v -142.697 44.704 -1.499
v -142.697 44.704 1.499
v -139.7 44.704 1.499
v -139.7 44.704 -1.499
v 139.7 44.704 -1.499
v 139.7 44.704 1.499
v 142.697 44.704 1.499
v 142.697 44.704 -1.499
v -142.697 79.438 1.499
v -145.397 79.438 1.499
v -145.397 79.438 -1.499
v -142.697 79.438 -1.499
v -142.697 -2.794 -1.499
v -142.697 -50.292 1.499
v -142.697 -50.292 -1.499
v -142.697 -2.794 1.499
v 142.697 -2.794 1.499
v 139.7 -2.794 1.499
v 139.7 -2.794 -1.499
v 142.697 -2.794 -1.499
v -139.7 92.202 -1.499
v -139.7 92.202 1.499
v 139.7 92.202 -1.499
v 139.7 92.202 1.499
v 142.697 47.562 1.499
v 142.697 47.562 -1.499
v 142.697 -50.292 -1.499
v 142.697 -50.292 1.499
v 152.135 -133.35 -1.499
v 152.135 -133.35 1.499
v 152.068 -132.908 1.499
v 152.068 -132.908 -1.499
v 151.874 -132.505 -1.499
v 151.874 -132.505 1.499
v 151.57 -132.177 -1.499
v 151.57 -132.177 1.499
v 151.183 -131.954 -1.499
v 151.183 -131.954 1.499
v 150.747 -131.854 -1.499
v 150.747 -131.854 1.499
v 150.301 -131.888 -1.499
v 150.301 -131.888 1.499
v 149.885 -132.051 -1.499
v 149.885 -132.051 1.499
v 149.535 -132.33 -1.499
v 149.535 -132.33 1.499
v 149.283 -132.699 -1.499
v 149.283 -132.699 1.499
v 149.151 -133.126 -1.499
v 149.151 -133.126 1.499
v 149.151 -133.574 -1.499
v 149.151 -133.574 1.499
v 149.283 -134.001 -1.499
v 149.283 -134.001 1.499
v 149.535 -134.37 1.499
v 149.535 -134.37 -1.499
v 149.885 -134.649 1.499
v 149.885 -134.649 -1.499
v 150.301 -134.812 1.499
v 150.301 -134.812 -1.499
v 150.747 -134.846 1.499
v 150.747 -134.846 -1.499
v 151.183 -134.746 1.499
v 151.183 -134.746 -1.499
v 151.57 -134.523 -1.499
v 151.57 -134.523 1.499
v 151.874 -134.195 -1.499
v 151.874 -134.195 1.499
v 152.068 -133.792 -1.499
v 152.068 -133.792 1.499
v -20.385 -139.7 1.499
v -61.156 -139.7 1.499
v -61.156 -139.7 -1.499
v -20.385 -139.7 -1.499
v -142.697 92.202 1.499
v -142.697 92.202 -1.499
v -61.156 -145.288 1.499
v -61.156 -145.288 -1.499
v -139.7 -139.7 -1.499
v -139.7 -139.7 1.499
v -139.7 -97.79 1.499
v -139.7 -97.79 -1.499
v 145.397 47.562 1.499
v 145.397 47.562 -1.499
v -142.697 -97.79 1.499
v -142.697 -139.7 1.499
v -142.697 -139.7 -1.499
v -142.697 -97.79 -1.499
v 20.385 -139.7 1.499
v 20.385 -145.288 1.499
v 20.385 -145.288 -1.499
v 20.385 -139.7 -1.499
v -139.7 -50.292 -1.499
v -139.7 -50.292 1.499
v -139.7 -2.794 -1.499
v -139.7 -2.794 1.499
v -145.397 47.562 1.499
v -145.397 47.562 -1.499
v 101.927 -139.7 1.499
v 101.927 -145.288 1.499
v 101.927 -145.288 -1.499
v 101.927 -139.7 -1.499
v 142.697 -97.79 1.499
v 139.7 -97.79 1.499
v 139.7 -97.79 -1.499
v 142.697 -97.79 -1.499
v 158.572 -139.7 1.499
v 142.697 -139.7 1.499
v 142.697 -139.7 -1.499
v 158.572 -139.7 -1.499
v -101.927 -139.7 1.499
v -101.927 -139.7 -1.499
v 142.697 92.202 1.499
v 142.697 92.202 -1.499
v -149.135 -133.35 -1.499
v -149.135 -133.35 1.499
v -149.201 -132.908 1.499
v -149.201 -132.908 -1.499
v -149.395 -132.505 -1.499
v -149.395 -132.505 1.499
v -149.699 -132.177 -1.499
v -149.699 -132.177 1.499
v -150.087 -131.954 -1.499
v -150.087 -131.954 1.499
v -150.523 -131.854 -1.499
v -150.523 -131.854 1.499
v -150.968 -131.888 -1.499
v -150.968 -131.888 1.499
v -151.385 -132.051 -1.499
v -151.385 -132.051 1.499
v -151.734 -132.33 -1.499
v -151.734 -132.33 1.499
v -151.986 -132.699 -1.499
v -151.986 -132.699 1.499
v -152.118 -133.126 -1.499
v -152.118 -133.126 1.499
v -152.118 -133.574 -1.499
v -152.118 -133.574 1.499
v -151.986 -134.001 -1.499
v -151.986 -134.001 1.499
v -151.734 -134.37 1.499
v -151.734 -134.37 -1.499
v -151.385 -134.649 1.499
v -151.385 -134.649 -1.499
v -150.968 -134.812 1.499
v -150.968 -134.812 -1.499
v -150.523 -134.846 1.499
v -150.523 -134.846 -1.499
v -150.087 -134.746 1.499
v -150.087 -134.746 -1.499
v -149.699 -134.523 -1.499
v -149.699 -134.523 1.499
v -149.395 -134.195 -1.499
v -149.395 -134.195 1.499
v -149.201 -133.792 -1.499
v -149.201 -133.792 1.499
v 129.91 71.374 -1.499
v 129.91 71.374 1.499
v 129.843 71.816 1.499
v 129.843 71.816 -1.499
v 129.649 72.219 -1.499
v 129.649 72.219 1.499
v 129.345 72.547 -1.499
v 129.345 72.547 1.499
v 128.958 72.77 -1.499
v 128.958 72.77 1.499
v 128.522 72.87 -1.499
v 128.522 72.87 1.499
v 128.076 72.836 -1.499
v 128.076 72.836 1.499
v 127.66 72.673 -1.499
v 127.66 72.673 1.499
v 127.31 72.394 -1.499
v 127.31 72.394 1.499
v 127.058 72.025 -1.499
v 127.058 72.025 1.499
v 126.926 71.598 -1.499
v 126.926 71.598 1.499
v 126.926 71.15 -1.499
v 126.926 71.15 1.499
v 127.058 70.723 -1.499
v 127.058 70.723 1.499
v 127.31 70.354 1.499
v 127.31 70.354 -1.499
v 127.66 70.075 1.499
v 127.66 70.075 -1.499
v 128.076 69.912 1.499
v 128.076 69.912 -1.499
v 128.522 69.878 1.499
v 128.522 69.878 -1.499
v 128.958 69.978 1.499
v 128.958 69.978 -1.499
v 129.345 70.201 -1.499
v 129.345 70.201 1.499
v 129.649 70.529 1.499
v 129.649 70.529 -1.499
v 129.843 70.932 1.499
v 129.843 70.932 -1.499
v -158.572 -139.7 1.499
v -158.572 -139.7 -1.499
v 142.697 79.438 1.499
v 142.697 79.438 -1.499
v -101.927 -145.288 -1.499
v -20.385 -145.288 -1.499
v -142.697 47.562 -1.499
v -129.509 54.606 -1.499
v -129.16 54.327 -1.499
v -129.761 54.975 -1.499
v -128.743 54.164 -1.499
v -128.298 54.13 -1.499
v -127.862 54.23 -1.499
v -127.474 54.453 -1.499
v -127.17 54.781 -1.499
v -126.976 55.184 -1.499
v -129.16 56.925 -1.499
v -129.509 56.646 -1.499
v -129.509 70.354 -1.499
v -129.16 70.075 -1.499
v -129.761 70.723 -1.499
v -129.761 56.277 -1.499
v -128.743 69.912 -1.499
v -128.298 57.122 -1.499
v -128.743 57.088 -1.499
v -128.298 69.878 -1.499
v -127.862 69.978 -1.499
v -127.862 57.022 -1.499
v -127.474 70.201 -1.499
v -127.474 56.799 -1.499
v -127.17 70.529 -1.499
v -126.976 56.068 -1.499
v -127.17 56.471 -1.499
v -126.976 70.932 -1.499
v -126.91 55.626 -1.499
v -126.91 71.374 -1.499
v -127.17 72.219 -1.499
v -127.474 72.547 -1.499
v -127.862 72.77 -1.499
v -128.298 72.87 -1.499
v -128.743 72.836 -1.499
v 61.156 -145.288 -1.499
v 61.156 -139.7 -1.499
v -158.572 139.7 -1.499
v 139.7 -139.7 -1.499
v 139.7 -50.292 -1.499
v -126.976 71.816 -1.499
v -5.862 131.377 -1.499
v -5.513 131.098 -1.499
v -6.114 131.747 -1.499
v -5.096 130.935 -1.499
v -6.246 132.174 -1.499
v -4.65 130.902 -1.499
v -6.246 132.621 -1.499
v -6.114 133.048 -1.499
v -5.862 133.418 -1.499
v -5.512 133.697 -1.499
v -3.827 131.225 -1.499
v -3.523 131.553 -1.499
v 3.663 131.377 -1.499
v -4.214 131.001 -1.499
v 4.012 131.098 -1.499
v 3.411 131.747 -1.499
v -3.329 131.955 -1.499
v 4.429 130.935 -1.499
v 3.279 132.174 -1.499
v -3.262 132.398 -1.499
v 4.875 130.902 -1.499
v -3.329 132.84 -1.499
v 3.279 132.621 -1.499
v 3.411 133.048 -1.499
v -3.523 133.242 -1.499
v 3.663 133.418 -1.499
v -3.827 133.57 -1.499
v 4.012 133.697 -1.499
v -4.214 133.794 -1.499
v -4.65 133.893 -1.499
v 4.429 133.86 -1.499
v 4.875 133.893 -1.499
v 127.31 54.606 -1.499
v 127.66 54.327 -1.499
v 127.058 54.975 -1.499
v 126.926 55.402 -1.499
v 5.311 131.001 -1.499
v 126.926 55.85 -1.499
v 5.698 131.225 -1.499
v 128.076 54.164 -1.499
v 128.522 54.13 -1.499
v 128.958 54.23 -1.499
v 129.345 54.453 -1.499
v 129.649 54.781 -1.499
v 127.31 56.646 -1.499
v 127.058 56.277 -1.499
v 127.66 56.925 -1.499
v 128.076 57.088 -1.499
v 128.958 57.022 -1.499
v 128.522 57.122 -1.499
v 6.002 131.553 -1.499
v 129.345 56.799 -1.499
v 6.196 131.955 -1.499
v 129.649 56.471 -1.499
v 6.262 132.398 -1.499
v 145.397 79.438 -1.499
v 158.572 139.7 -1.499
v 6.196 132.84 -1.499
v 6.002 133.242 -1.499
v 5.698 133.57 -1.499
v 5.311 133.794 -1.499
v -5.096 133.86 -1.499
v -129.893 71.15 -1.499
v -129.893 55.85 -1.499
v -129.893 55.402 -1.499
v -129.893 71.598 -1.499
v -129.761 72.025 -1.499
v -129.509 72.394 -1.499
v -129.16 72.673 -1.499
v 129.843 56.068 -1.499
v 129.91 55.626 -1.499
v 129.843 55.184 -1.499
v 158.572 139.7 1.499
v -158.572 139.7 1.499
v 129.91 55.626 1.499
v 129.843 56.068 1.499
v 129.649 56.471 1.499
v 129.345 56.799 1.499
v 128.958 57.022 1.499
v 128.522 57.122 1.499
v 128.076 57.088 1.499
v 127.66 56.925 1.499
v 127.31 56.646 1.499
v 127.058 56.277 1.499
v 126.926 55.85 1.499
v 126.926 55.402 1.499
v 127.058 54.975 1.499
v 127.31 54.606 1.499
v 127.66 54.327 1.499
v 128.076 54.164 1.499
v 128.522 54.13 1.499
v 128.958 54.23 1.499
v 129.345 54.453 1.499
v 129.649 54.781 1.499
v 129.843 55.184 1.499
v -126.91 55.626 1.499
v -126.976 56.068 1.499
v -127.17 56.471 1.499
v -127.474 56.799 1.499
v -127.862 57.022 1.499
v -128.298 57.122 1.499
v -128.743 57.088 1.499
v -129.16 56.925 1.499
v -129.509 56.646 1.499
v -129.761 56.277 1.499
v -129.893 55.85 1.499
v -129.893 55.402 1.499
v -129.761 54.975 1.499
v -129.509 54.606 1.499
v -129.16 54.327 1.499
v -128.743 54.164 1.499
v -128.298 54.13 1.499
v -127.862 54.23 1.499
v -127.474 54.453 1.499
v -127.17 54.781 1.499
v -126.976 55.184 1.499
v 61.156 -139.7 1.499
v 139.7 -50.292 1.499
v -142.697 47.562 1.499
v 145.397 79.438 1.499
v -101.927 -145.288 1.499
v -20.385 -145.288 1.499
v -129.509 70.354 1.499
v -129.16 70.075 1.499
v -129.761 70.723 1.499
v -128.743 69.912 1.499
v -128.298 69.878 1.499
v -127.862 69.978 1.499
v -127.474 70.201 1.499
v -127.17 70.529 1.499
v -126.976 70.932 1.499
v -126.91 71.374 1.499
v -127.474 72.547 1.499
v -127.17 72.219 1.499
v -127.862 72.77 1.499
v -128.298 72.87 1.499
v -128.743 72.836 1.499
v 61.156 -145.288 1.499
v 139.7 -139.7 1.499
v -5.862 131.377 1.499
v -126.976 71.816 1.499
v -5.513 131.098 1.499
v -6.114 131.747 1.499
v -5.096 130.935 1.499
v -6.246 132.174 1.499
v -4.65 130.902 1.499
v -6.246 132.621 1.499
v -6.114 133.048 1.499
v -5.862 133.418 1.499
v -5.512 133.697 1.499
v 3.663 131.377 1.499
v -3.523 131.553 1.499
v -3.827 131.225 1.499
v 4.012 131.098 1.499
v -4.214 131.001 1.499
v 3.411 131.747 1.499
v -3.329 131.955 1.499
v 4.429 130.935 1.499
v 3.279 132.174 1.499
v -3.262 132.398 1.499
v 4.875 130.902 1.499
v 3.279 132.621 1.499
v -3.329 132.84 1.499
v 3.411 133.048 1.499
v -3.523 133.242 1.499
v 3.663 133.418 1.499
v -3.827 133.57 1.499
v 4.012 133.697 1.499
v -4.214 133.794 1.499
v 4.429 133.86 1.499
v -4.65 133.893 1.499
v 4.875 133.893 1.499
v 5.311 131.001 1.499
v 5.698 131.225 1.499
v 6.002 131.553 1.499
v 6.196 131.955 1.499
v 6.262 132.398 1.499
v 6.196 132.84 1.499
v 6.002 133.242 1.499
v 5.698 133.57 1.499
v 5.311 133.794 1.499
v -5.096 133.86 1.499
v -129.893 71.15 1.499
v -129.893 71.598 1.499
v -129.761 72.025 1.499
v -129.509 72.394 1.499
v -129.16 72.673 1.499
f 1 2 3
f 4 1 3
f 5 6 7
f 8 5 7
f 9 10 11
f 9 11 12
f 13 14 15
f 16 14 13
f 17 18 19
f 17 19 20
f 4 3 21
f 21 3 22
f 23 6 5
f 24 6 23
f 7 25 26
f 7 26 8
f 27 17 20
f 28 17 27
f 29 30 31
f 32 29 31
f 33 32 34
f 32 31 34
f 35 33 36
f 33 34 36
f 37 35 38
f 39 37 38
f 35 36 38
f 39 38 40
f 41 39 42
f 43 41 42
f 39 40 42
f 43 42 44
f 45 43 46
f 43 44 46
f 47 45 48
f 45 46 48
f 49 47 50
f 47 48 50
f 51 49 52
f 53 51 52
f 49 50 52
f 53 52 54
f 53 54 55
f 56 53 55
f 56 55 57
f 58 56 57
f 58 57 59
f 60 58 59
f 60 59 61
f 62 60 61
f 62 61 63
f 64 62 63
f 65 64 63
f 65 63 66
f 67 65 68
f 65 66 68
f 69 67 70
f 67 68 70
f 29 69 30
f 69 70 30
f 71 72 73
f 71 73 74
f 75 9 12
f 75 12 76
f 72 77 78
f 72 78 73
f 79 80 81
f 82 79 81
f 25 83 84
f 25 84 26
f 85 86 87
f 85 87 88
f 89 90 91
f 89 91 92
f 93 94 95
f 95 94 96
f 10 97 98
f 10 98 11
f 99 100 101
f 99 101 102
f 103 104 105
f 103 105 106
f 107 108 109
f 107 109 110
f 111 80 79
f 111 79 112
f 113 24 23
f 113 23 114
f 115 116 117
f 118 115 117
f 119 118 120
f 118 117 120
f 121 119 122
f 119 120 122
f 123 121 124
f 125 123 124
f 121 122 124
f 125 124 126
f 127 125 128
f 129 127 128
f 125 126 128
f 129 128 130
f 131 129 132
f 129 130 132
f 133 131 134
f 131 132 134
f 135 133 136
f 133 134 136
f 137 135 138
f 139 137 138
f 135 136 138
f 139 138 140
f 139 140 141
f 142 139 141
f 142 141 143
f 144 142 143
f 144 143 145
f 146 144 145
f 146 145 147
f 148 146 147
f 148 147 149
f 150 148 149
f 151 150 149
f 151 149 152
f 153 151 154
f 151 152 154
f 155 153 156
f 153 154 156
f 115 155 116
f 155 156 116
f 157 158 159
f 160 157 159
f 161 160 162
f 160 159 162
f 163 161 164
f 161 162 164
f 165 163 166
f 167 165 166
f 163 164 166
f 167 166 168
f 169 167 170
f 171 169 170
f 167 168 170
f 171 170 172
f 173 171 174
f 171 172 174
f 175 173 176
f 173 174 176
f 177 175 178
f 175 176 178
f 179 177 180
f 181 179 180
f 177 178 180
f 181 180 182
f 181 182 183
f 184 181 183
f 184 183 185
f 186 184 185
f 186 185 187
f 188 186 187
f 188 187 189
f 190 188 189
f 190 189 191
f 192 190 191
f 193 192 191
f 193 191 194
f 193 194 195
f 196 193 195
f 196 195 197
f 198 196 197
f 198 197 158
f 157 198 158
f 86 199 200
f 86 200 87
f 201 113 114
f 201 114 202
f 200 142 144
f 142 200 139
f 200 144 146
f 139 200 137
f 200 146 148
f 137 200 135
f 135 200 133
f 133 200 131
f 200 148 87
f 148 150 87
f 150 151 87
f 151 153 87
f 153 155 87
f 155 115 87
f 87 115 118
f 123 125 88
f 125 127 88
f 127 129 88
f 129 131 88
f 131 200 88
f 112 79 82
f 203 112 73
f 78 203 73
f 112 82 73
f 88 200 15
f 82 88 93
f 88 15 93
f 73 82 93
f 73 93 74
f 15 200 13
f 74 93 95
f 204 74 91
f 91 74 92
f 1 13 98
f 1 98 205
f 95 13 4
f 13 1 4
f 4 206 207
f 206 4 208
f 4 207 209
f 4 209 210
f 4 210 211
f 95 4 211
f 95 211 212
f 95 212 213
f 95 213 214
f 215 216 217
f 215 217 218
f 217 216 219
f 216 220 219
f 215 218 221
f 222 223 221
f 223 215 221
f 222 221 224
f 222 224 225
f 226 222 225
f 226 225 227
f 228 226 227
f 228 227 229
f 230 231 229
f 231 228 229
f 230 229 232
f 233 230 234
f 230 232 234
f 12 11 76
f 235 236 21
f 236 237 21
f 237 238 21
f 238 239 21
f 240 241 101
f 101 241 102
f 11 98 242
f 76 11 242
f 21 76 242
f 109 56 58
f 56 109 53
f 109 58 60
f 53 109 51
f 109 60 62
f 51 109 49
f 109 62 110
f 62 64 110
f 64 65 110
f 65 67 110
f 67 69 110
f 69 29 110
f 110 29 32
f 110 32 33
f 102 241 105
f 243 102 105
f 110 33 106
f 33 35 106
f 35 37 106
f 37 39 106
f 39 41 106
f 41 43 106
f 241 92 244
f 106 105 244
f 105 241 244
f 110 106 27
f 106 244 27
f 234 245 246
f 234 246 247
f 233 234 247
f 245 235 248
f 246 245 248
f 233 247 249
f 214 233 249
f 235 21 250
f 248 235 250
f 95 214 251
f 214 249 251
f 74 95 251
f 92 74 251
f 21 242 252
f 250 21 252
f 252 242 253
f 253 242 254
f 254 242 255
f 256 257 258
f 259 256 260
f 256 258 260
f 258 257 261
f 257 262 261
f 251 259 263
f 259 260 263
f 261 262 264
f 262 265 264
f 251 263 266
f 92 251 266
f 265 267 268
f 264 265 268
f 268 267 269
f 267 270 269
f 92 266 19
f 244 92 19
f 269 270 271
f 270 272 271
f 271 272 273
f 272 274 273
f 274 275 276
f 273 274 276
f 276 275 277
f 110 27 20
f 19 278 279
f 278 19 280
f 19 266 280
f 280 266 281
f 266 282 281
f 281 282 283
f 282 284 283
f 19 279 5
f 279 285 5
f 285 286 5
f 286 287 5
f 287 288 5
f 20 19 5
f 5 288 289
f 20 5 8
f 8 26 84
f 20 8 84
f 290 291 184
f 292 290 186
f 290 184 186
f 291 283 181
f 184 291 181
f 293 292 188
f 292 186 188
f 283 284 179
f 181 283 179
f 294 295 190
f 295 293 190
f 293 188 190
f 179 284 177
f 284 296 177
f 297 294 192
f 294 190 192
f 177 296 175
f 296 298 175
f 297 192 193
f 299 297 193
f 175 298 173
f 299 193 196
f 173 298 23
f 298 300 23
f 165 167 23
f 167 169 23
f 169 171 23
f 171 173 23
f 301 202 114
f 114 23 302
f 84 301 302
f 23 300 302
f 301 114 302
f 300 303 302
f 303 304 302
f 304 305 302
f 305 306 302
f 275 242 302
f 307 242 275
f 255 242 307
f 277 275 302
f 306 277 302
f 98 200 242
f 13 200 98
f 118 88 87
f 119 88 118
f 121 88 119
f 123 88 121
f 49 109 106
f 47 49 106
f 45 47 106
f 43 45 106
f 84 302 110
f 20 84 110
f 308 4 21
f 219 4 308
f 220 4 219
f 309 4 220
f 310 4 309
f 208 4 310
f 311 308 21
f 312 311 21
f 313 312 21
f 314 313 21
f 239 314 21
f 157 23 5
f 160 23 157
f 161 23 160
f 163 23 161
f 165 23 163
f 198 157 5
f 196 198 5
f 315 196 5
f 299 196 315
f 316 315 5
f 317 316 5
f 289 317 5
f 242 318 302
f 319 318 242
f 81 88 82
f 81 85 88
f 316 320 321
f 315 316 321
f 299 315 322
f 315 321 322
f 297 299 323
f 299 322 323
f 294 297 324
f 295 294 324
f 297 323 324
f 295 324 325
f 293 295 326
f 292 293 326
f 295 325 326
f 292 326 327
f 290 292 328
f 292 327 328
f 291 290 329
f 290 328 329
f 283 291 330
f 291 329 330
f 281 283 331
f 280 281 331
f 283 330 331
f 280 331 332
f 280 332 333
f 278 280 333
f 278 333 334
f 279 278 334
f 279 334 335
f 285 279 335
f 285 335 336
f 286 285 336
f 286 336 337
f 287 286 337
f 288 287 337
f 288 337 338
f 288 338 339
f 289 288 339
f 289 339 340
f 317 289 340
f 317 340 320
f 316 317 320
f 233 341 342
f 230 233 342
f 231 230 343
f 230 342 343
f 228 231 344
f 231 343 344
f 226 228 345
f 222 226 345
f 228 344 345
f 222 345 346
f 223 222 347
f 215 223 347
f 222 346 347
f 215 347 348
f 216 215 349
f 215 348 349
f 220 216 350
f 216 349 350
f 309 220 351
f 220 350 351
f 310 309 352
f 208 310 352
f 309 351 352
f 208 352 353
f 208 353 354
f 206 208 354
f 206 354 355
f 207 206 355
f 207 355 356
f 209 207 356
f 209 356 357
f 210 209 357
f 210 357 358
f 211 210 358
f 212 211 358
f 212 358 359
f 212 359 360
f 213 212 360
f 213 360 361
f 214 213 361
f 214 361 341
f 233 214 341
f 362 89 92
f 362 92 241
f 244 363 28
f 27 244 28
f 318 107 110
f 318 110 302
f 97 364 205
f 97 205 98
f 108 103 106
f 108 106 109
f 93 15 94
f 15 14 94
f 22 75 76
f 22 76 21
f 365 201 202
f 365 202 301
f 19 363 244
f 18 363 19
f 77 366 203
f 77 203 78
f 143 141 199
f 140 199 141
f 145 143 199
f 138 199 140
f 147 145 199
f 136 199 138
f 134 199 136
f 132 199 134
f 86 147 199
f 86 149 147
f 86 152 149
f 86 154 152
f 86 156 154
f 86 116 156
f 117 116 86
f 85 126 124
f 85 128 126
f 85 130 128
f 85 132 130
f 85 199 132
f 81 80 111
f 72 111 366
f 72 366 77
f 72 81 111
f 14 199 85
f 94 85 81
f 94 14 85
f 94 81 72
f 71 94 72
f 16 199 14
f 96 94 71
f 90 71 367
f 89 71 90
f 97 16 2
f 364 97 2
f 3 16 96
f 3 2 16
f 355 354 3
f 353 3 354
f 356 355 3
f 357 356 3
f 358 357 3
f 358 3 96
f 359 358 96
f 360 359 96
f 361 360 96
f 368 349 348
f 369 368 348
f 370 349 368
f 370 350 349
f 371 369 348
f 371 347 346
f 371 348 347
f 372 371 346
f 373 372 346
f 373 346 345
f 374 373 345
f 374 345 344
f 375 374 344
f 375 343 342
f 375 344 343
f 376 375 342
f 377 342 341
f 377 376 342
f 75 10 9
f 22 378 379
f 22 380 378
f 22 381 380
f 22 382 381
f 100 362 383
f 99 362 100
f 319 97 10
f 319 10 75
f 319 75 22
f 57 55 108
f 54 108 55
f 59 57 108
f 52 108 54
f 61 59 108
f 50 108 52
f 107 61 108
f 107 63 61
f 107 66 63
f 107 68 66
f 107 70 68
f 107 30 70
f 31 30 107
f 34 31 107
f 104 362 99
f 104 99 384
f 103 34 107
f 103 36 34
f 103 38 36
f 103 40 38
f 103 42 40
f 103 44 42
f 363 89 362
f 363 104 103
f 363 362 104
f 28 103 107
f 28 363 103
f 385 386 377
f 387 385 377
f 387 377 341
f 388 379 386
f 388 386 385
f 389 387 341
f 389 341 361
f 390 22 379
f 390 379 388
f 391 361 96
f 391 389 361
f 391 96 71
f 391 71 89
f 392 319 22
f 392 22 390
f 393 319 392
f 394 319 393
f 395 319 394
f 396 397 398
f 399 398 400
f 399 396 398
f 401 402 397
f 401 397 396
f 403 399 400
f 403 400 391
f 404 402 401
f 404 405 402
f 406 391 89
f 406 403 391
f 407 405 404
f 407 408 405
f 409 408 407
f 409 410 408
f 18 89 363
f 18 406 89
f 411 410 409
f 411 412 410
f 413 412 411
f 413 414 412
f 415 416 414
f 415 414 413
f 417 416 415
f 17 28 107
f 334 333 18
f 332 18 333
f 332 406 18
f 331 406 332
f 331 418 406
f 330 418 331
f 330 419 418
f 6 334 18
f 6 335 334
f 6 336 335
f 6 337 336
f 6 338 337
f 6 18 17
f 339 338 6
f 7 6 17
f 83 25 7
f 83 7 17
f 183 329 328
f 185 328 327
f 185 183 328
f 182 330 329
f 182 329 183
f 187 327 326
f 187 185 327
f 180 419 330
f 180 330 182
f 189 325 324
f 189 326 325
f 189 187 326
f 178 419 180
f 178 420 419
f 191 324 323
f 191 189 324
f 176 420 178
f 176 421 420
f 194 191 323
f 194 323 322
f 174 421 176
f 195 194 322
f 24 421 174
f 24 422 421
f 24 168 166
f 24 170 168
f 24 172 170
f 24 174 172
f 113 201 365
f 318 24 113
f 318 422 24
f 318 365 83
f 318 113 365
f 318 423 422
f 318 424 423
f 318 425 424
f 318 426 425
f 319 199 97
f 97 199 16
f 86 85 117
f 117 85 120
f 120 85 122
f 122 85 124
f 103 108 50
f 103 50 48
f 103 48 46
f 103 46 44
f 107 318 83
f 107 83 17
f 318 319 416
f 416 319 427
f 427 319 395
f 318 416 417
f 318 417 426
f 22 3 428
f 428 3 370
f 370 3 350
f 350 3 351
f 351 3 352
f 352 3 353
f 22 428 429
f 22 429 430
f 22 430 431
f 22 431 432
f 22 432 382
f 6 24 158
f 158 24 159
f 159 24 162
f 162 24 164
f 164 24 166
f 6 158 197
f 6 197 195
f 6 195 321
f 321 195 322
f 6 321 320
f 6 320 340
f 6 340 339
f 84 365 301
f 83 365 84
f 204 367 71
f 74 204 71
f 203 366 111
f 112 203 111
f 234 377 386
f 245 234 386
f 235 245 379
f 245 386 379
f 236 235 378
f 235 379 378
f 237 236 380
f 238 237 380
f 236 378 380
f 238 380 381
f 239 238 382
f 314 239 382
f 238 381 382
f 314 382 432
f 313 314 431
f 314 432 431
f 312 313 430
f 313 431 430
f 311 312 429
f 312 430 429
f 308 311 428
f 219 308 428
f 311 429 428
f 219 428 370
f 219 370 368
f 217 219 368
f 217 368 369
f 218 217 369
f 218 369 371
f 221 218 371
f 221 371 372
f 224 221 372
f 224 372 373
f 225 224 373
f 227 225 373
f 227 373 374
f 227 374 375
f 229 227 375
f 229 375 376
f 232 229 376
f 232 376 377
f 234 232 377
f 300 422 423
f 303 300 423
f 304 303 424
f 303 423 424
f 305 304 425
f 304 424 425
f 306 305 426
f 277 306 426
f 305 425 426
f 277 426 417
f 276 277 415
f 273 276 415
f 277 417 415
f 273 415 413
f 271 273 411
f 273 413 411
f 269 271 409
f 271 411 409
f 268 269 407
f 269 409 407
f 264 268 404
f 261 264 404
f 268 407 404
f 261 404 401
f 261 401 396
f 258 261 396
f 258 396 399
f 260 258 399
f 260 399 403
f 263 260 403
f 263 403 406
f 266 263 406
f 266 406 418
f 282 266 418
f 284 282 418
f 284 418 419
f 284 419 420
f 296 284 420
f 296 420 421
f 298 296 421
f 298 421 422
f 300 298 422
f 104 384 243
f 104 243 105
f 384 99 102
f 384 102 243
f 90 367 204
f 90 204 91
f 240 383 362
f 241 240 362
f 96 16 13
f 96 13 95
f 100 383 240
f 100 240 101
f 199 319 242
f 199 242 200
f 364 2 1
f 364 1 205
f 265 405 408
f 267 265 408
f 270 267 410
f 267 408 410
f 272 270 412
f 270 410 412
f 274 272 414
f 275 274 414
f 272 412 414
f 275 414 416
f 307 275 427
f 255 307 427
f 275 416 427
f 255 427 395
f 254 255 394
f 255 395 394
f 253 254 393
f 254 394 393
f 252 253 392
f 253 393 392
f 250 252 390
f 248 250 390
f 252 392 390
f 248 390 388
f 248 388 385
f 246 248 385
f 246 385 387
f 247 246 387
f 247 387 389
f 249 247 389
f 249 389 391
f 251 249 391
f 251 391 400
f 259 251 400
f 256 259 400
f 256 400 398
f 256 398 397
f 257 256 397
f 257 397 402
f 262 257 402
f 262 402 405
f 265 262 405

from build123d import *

# Parameters (mm, degrees)
SKETCH1_W           = 279.4
SKETCH1_H           = 279.4
SKETCH1_W_2         = 2.9972
SKETCH1_H_2         = 47.498
SKETCH1_W_3         = 40.770628572
SKETCH1_H_3         = 5.588
BOSS_EXTRUDE1_DEPTH = 1.4986
SKETCH3_R           = 1.5
CUT_EXTRUDE2_DEPTH  = 204.666583022
SKETCH4_R           = 1.5
BOSS_EXTRUDE2_DEPTH = 2.9972
SKETCH5_R           = 1.5
CUT_EXTRUDE3_DEPTH  = 216.087723417


with BuildPart() as part:
    # Sketch1 → Boss-Extrude1 (new, symmetric)
    with BuildSketch(Plane.XY):
        Rectangle(SKETCH1_W, SKETCH1_H)
        with Locations((-141.1986, -74.041)):
            Rectangle(SKETCH1_W_2, SKETCH1_H_2)
        with Locations((-81.541257143, -142.494)):
            Rectangle(SKETCH1_W_3, SKETCH1_H_3)
        with Locations((0, -142.494)):
            Rectangle(SKETCH1_W_3, SKETCH1_H_3)
        with Locations((81.541257143, -142.494)):
            Rectangle(SKETCH1_W_3, SKETCH1_H_3)
        with Locations((141.1986, -74.041)):
            Rectangle(SKETCH1_W_2, SKETCH1_H_2)
        with Locations((141.1986, 20.955)):
            Rectangle(SKETCH1_W_2, SKETCH1_H_2)
        with Locations((141.1986, 115.951)):
            Rectangle(SKETCH1_W_2, SKETCH1_H_2)
        with Locations((-141.1986, 20.955)):
            Rectangle(SKETCH1_W_2, SKETCH1_H_2)
        with Locations((-141.1986, 115.951)):
            Rectangle(SKETCH1_W_2, SKETCH1_H_2)
    extrude(amount=BOSS_EXTRUDE1_DEPTH, both=True)

    # Sketch3 → Cut-Extrude2 (cut, through all)
    with BuildSketch(Plane.XY.offset(1.4986)):
        with Locations((-128.4097, 71.374)):
            Circle(SKETCH3_R)
        with Locations((-128.4097, 55.626)):
            Circle(SKETCH3_R)
        with Locations((128.4097, 71.374)):
            Circle(SKETCH3_R)
        with Locations((128.4097, 55.626)):
            Circle(SKETCH3_R)
    extrude(amount=-CUT_EXTRUDE2_DEPTH, mode=Mode.SUBTRACT)

    # Sketch4 → Boss-Extrude2 (add)
    # profile 1 of 2: a face of its own
    with BuildSketch(Plane.XY.offset(1.4986)):
        Polygon((-142.6972, 79.4385), (-142.6972, 139.7), (-158.5722, 139.7), (-158.5722, -139.7), (-142.6972, -139.7), (-142.6972, 47.5615), (-145.3972, 47.5615), (-145.3972, 79.4385), align=None)
        with Locations((-150.6347, -133.35)):
            Circle(SKETCH4_R, mode=Mode.SUBTRACT)
    # profile 2 of 2: a face of its own
    with BuildSketch(Plane.XY.offset(1.4986)):
        Polygon((158.5722, 139.7), (142.6972, 139.7), (142.6972, 79.4385), (145.3972, 79.4385), (145.3972, 47.5615), (142.6972, 47.5615), (142.6972, -139.7), (158.5722, -139.7), align=None)
        with Locations((150.6347, -133.35)):
            Circle(SKETCH4_R, mode=Mode.SUBTRACT)
    extrude(amount=-BOSS_EXTRUDE2_DEPTH)

    # Sketch5 → Cut-Extrude3 (cut, through all)
    with BuildSketch(Plane.XY.offset(1.4986)):
        with Locations((-4.7625, 132.3975)):
            Circle(SKETCH5_R)
        with Locations((4.7625, 132.3975)):
            Circle(SKETCH5_R)
    extrude(amount=-CUT_EXTRUDE3_DEPTH, mode=Mode.SUBTRACT)


solid = part.part
